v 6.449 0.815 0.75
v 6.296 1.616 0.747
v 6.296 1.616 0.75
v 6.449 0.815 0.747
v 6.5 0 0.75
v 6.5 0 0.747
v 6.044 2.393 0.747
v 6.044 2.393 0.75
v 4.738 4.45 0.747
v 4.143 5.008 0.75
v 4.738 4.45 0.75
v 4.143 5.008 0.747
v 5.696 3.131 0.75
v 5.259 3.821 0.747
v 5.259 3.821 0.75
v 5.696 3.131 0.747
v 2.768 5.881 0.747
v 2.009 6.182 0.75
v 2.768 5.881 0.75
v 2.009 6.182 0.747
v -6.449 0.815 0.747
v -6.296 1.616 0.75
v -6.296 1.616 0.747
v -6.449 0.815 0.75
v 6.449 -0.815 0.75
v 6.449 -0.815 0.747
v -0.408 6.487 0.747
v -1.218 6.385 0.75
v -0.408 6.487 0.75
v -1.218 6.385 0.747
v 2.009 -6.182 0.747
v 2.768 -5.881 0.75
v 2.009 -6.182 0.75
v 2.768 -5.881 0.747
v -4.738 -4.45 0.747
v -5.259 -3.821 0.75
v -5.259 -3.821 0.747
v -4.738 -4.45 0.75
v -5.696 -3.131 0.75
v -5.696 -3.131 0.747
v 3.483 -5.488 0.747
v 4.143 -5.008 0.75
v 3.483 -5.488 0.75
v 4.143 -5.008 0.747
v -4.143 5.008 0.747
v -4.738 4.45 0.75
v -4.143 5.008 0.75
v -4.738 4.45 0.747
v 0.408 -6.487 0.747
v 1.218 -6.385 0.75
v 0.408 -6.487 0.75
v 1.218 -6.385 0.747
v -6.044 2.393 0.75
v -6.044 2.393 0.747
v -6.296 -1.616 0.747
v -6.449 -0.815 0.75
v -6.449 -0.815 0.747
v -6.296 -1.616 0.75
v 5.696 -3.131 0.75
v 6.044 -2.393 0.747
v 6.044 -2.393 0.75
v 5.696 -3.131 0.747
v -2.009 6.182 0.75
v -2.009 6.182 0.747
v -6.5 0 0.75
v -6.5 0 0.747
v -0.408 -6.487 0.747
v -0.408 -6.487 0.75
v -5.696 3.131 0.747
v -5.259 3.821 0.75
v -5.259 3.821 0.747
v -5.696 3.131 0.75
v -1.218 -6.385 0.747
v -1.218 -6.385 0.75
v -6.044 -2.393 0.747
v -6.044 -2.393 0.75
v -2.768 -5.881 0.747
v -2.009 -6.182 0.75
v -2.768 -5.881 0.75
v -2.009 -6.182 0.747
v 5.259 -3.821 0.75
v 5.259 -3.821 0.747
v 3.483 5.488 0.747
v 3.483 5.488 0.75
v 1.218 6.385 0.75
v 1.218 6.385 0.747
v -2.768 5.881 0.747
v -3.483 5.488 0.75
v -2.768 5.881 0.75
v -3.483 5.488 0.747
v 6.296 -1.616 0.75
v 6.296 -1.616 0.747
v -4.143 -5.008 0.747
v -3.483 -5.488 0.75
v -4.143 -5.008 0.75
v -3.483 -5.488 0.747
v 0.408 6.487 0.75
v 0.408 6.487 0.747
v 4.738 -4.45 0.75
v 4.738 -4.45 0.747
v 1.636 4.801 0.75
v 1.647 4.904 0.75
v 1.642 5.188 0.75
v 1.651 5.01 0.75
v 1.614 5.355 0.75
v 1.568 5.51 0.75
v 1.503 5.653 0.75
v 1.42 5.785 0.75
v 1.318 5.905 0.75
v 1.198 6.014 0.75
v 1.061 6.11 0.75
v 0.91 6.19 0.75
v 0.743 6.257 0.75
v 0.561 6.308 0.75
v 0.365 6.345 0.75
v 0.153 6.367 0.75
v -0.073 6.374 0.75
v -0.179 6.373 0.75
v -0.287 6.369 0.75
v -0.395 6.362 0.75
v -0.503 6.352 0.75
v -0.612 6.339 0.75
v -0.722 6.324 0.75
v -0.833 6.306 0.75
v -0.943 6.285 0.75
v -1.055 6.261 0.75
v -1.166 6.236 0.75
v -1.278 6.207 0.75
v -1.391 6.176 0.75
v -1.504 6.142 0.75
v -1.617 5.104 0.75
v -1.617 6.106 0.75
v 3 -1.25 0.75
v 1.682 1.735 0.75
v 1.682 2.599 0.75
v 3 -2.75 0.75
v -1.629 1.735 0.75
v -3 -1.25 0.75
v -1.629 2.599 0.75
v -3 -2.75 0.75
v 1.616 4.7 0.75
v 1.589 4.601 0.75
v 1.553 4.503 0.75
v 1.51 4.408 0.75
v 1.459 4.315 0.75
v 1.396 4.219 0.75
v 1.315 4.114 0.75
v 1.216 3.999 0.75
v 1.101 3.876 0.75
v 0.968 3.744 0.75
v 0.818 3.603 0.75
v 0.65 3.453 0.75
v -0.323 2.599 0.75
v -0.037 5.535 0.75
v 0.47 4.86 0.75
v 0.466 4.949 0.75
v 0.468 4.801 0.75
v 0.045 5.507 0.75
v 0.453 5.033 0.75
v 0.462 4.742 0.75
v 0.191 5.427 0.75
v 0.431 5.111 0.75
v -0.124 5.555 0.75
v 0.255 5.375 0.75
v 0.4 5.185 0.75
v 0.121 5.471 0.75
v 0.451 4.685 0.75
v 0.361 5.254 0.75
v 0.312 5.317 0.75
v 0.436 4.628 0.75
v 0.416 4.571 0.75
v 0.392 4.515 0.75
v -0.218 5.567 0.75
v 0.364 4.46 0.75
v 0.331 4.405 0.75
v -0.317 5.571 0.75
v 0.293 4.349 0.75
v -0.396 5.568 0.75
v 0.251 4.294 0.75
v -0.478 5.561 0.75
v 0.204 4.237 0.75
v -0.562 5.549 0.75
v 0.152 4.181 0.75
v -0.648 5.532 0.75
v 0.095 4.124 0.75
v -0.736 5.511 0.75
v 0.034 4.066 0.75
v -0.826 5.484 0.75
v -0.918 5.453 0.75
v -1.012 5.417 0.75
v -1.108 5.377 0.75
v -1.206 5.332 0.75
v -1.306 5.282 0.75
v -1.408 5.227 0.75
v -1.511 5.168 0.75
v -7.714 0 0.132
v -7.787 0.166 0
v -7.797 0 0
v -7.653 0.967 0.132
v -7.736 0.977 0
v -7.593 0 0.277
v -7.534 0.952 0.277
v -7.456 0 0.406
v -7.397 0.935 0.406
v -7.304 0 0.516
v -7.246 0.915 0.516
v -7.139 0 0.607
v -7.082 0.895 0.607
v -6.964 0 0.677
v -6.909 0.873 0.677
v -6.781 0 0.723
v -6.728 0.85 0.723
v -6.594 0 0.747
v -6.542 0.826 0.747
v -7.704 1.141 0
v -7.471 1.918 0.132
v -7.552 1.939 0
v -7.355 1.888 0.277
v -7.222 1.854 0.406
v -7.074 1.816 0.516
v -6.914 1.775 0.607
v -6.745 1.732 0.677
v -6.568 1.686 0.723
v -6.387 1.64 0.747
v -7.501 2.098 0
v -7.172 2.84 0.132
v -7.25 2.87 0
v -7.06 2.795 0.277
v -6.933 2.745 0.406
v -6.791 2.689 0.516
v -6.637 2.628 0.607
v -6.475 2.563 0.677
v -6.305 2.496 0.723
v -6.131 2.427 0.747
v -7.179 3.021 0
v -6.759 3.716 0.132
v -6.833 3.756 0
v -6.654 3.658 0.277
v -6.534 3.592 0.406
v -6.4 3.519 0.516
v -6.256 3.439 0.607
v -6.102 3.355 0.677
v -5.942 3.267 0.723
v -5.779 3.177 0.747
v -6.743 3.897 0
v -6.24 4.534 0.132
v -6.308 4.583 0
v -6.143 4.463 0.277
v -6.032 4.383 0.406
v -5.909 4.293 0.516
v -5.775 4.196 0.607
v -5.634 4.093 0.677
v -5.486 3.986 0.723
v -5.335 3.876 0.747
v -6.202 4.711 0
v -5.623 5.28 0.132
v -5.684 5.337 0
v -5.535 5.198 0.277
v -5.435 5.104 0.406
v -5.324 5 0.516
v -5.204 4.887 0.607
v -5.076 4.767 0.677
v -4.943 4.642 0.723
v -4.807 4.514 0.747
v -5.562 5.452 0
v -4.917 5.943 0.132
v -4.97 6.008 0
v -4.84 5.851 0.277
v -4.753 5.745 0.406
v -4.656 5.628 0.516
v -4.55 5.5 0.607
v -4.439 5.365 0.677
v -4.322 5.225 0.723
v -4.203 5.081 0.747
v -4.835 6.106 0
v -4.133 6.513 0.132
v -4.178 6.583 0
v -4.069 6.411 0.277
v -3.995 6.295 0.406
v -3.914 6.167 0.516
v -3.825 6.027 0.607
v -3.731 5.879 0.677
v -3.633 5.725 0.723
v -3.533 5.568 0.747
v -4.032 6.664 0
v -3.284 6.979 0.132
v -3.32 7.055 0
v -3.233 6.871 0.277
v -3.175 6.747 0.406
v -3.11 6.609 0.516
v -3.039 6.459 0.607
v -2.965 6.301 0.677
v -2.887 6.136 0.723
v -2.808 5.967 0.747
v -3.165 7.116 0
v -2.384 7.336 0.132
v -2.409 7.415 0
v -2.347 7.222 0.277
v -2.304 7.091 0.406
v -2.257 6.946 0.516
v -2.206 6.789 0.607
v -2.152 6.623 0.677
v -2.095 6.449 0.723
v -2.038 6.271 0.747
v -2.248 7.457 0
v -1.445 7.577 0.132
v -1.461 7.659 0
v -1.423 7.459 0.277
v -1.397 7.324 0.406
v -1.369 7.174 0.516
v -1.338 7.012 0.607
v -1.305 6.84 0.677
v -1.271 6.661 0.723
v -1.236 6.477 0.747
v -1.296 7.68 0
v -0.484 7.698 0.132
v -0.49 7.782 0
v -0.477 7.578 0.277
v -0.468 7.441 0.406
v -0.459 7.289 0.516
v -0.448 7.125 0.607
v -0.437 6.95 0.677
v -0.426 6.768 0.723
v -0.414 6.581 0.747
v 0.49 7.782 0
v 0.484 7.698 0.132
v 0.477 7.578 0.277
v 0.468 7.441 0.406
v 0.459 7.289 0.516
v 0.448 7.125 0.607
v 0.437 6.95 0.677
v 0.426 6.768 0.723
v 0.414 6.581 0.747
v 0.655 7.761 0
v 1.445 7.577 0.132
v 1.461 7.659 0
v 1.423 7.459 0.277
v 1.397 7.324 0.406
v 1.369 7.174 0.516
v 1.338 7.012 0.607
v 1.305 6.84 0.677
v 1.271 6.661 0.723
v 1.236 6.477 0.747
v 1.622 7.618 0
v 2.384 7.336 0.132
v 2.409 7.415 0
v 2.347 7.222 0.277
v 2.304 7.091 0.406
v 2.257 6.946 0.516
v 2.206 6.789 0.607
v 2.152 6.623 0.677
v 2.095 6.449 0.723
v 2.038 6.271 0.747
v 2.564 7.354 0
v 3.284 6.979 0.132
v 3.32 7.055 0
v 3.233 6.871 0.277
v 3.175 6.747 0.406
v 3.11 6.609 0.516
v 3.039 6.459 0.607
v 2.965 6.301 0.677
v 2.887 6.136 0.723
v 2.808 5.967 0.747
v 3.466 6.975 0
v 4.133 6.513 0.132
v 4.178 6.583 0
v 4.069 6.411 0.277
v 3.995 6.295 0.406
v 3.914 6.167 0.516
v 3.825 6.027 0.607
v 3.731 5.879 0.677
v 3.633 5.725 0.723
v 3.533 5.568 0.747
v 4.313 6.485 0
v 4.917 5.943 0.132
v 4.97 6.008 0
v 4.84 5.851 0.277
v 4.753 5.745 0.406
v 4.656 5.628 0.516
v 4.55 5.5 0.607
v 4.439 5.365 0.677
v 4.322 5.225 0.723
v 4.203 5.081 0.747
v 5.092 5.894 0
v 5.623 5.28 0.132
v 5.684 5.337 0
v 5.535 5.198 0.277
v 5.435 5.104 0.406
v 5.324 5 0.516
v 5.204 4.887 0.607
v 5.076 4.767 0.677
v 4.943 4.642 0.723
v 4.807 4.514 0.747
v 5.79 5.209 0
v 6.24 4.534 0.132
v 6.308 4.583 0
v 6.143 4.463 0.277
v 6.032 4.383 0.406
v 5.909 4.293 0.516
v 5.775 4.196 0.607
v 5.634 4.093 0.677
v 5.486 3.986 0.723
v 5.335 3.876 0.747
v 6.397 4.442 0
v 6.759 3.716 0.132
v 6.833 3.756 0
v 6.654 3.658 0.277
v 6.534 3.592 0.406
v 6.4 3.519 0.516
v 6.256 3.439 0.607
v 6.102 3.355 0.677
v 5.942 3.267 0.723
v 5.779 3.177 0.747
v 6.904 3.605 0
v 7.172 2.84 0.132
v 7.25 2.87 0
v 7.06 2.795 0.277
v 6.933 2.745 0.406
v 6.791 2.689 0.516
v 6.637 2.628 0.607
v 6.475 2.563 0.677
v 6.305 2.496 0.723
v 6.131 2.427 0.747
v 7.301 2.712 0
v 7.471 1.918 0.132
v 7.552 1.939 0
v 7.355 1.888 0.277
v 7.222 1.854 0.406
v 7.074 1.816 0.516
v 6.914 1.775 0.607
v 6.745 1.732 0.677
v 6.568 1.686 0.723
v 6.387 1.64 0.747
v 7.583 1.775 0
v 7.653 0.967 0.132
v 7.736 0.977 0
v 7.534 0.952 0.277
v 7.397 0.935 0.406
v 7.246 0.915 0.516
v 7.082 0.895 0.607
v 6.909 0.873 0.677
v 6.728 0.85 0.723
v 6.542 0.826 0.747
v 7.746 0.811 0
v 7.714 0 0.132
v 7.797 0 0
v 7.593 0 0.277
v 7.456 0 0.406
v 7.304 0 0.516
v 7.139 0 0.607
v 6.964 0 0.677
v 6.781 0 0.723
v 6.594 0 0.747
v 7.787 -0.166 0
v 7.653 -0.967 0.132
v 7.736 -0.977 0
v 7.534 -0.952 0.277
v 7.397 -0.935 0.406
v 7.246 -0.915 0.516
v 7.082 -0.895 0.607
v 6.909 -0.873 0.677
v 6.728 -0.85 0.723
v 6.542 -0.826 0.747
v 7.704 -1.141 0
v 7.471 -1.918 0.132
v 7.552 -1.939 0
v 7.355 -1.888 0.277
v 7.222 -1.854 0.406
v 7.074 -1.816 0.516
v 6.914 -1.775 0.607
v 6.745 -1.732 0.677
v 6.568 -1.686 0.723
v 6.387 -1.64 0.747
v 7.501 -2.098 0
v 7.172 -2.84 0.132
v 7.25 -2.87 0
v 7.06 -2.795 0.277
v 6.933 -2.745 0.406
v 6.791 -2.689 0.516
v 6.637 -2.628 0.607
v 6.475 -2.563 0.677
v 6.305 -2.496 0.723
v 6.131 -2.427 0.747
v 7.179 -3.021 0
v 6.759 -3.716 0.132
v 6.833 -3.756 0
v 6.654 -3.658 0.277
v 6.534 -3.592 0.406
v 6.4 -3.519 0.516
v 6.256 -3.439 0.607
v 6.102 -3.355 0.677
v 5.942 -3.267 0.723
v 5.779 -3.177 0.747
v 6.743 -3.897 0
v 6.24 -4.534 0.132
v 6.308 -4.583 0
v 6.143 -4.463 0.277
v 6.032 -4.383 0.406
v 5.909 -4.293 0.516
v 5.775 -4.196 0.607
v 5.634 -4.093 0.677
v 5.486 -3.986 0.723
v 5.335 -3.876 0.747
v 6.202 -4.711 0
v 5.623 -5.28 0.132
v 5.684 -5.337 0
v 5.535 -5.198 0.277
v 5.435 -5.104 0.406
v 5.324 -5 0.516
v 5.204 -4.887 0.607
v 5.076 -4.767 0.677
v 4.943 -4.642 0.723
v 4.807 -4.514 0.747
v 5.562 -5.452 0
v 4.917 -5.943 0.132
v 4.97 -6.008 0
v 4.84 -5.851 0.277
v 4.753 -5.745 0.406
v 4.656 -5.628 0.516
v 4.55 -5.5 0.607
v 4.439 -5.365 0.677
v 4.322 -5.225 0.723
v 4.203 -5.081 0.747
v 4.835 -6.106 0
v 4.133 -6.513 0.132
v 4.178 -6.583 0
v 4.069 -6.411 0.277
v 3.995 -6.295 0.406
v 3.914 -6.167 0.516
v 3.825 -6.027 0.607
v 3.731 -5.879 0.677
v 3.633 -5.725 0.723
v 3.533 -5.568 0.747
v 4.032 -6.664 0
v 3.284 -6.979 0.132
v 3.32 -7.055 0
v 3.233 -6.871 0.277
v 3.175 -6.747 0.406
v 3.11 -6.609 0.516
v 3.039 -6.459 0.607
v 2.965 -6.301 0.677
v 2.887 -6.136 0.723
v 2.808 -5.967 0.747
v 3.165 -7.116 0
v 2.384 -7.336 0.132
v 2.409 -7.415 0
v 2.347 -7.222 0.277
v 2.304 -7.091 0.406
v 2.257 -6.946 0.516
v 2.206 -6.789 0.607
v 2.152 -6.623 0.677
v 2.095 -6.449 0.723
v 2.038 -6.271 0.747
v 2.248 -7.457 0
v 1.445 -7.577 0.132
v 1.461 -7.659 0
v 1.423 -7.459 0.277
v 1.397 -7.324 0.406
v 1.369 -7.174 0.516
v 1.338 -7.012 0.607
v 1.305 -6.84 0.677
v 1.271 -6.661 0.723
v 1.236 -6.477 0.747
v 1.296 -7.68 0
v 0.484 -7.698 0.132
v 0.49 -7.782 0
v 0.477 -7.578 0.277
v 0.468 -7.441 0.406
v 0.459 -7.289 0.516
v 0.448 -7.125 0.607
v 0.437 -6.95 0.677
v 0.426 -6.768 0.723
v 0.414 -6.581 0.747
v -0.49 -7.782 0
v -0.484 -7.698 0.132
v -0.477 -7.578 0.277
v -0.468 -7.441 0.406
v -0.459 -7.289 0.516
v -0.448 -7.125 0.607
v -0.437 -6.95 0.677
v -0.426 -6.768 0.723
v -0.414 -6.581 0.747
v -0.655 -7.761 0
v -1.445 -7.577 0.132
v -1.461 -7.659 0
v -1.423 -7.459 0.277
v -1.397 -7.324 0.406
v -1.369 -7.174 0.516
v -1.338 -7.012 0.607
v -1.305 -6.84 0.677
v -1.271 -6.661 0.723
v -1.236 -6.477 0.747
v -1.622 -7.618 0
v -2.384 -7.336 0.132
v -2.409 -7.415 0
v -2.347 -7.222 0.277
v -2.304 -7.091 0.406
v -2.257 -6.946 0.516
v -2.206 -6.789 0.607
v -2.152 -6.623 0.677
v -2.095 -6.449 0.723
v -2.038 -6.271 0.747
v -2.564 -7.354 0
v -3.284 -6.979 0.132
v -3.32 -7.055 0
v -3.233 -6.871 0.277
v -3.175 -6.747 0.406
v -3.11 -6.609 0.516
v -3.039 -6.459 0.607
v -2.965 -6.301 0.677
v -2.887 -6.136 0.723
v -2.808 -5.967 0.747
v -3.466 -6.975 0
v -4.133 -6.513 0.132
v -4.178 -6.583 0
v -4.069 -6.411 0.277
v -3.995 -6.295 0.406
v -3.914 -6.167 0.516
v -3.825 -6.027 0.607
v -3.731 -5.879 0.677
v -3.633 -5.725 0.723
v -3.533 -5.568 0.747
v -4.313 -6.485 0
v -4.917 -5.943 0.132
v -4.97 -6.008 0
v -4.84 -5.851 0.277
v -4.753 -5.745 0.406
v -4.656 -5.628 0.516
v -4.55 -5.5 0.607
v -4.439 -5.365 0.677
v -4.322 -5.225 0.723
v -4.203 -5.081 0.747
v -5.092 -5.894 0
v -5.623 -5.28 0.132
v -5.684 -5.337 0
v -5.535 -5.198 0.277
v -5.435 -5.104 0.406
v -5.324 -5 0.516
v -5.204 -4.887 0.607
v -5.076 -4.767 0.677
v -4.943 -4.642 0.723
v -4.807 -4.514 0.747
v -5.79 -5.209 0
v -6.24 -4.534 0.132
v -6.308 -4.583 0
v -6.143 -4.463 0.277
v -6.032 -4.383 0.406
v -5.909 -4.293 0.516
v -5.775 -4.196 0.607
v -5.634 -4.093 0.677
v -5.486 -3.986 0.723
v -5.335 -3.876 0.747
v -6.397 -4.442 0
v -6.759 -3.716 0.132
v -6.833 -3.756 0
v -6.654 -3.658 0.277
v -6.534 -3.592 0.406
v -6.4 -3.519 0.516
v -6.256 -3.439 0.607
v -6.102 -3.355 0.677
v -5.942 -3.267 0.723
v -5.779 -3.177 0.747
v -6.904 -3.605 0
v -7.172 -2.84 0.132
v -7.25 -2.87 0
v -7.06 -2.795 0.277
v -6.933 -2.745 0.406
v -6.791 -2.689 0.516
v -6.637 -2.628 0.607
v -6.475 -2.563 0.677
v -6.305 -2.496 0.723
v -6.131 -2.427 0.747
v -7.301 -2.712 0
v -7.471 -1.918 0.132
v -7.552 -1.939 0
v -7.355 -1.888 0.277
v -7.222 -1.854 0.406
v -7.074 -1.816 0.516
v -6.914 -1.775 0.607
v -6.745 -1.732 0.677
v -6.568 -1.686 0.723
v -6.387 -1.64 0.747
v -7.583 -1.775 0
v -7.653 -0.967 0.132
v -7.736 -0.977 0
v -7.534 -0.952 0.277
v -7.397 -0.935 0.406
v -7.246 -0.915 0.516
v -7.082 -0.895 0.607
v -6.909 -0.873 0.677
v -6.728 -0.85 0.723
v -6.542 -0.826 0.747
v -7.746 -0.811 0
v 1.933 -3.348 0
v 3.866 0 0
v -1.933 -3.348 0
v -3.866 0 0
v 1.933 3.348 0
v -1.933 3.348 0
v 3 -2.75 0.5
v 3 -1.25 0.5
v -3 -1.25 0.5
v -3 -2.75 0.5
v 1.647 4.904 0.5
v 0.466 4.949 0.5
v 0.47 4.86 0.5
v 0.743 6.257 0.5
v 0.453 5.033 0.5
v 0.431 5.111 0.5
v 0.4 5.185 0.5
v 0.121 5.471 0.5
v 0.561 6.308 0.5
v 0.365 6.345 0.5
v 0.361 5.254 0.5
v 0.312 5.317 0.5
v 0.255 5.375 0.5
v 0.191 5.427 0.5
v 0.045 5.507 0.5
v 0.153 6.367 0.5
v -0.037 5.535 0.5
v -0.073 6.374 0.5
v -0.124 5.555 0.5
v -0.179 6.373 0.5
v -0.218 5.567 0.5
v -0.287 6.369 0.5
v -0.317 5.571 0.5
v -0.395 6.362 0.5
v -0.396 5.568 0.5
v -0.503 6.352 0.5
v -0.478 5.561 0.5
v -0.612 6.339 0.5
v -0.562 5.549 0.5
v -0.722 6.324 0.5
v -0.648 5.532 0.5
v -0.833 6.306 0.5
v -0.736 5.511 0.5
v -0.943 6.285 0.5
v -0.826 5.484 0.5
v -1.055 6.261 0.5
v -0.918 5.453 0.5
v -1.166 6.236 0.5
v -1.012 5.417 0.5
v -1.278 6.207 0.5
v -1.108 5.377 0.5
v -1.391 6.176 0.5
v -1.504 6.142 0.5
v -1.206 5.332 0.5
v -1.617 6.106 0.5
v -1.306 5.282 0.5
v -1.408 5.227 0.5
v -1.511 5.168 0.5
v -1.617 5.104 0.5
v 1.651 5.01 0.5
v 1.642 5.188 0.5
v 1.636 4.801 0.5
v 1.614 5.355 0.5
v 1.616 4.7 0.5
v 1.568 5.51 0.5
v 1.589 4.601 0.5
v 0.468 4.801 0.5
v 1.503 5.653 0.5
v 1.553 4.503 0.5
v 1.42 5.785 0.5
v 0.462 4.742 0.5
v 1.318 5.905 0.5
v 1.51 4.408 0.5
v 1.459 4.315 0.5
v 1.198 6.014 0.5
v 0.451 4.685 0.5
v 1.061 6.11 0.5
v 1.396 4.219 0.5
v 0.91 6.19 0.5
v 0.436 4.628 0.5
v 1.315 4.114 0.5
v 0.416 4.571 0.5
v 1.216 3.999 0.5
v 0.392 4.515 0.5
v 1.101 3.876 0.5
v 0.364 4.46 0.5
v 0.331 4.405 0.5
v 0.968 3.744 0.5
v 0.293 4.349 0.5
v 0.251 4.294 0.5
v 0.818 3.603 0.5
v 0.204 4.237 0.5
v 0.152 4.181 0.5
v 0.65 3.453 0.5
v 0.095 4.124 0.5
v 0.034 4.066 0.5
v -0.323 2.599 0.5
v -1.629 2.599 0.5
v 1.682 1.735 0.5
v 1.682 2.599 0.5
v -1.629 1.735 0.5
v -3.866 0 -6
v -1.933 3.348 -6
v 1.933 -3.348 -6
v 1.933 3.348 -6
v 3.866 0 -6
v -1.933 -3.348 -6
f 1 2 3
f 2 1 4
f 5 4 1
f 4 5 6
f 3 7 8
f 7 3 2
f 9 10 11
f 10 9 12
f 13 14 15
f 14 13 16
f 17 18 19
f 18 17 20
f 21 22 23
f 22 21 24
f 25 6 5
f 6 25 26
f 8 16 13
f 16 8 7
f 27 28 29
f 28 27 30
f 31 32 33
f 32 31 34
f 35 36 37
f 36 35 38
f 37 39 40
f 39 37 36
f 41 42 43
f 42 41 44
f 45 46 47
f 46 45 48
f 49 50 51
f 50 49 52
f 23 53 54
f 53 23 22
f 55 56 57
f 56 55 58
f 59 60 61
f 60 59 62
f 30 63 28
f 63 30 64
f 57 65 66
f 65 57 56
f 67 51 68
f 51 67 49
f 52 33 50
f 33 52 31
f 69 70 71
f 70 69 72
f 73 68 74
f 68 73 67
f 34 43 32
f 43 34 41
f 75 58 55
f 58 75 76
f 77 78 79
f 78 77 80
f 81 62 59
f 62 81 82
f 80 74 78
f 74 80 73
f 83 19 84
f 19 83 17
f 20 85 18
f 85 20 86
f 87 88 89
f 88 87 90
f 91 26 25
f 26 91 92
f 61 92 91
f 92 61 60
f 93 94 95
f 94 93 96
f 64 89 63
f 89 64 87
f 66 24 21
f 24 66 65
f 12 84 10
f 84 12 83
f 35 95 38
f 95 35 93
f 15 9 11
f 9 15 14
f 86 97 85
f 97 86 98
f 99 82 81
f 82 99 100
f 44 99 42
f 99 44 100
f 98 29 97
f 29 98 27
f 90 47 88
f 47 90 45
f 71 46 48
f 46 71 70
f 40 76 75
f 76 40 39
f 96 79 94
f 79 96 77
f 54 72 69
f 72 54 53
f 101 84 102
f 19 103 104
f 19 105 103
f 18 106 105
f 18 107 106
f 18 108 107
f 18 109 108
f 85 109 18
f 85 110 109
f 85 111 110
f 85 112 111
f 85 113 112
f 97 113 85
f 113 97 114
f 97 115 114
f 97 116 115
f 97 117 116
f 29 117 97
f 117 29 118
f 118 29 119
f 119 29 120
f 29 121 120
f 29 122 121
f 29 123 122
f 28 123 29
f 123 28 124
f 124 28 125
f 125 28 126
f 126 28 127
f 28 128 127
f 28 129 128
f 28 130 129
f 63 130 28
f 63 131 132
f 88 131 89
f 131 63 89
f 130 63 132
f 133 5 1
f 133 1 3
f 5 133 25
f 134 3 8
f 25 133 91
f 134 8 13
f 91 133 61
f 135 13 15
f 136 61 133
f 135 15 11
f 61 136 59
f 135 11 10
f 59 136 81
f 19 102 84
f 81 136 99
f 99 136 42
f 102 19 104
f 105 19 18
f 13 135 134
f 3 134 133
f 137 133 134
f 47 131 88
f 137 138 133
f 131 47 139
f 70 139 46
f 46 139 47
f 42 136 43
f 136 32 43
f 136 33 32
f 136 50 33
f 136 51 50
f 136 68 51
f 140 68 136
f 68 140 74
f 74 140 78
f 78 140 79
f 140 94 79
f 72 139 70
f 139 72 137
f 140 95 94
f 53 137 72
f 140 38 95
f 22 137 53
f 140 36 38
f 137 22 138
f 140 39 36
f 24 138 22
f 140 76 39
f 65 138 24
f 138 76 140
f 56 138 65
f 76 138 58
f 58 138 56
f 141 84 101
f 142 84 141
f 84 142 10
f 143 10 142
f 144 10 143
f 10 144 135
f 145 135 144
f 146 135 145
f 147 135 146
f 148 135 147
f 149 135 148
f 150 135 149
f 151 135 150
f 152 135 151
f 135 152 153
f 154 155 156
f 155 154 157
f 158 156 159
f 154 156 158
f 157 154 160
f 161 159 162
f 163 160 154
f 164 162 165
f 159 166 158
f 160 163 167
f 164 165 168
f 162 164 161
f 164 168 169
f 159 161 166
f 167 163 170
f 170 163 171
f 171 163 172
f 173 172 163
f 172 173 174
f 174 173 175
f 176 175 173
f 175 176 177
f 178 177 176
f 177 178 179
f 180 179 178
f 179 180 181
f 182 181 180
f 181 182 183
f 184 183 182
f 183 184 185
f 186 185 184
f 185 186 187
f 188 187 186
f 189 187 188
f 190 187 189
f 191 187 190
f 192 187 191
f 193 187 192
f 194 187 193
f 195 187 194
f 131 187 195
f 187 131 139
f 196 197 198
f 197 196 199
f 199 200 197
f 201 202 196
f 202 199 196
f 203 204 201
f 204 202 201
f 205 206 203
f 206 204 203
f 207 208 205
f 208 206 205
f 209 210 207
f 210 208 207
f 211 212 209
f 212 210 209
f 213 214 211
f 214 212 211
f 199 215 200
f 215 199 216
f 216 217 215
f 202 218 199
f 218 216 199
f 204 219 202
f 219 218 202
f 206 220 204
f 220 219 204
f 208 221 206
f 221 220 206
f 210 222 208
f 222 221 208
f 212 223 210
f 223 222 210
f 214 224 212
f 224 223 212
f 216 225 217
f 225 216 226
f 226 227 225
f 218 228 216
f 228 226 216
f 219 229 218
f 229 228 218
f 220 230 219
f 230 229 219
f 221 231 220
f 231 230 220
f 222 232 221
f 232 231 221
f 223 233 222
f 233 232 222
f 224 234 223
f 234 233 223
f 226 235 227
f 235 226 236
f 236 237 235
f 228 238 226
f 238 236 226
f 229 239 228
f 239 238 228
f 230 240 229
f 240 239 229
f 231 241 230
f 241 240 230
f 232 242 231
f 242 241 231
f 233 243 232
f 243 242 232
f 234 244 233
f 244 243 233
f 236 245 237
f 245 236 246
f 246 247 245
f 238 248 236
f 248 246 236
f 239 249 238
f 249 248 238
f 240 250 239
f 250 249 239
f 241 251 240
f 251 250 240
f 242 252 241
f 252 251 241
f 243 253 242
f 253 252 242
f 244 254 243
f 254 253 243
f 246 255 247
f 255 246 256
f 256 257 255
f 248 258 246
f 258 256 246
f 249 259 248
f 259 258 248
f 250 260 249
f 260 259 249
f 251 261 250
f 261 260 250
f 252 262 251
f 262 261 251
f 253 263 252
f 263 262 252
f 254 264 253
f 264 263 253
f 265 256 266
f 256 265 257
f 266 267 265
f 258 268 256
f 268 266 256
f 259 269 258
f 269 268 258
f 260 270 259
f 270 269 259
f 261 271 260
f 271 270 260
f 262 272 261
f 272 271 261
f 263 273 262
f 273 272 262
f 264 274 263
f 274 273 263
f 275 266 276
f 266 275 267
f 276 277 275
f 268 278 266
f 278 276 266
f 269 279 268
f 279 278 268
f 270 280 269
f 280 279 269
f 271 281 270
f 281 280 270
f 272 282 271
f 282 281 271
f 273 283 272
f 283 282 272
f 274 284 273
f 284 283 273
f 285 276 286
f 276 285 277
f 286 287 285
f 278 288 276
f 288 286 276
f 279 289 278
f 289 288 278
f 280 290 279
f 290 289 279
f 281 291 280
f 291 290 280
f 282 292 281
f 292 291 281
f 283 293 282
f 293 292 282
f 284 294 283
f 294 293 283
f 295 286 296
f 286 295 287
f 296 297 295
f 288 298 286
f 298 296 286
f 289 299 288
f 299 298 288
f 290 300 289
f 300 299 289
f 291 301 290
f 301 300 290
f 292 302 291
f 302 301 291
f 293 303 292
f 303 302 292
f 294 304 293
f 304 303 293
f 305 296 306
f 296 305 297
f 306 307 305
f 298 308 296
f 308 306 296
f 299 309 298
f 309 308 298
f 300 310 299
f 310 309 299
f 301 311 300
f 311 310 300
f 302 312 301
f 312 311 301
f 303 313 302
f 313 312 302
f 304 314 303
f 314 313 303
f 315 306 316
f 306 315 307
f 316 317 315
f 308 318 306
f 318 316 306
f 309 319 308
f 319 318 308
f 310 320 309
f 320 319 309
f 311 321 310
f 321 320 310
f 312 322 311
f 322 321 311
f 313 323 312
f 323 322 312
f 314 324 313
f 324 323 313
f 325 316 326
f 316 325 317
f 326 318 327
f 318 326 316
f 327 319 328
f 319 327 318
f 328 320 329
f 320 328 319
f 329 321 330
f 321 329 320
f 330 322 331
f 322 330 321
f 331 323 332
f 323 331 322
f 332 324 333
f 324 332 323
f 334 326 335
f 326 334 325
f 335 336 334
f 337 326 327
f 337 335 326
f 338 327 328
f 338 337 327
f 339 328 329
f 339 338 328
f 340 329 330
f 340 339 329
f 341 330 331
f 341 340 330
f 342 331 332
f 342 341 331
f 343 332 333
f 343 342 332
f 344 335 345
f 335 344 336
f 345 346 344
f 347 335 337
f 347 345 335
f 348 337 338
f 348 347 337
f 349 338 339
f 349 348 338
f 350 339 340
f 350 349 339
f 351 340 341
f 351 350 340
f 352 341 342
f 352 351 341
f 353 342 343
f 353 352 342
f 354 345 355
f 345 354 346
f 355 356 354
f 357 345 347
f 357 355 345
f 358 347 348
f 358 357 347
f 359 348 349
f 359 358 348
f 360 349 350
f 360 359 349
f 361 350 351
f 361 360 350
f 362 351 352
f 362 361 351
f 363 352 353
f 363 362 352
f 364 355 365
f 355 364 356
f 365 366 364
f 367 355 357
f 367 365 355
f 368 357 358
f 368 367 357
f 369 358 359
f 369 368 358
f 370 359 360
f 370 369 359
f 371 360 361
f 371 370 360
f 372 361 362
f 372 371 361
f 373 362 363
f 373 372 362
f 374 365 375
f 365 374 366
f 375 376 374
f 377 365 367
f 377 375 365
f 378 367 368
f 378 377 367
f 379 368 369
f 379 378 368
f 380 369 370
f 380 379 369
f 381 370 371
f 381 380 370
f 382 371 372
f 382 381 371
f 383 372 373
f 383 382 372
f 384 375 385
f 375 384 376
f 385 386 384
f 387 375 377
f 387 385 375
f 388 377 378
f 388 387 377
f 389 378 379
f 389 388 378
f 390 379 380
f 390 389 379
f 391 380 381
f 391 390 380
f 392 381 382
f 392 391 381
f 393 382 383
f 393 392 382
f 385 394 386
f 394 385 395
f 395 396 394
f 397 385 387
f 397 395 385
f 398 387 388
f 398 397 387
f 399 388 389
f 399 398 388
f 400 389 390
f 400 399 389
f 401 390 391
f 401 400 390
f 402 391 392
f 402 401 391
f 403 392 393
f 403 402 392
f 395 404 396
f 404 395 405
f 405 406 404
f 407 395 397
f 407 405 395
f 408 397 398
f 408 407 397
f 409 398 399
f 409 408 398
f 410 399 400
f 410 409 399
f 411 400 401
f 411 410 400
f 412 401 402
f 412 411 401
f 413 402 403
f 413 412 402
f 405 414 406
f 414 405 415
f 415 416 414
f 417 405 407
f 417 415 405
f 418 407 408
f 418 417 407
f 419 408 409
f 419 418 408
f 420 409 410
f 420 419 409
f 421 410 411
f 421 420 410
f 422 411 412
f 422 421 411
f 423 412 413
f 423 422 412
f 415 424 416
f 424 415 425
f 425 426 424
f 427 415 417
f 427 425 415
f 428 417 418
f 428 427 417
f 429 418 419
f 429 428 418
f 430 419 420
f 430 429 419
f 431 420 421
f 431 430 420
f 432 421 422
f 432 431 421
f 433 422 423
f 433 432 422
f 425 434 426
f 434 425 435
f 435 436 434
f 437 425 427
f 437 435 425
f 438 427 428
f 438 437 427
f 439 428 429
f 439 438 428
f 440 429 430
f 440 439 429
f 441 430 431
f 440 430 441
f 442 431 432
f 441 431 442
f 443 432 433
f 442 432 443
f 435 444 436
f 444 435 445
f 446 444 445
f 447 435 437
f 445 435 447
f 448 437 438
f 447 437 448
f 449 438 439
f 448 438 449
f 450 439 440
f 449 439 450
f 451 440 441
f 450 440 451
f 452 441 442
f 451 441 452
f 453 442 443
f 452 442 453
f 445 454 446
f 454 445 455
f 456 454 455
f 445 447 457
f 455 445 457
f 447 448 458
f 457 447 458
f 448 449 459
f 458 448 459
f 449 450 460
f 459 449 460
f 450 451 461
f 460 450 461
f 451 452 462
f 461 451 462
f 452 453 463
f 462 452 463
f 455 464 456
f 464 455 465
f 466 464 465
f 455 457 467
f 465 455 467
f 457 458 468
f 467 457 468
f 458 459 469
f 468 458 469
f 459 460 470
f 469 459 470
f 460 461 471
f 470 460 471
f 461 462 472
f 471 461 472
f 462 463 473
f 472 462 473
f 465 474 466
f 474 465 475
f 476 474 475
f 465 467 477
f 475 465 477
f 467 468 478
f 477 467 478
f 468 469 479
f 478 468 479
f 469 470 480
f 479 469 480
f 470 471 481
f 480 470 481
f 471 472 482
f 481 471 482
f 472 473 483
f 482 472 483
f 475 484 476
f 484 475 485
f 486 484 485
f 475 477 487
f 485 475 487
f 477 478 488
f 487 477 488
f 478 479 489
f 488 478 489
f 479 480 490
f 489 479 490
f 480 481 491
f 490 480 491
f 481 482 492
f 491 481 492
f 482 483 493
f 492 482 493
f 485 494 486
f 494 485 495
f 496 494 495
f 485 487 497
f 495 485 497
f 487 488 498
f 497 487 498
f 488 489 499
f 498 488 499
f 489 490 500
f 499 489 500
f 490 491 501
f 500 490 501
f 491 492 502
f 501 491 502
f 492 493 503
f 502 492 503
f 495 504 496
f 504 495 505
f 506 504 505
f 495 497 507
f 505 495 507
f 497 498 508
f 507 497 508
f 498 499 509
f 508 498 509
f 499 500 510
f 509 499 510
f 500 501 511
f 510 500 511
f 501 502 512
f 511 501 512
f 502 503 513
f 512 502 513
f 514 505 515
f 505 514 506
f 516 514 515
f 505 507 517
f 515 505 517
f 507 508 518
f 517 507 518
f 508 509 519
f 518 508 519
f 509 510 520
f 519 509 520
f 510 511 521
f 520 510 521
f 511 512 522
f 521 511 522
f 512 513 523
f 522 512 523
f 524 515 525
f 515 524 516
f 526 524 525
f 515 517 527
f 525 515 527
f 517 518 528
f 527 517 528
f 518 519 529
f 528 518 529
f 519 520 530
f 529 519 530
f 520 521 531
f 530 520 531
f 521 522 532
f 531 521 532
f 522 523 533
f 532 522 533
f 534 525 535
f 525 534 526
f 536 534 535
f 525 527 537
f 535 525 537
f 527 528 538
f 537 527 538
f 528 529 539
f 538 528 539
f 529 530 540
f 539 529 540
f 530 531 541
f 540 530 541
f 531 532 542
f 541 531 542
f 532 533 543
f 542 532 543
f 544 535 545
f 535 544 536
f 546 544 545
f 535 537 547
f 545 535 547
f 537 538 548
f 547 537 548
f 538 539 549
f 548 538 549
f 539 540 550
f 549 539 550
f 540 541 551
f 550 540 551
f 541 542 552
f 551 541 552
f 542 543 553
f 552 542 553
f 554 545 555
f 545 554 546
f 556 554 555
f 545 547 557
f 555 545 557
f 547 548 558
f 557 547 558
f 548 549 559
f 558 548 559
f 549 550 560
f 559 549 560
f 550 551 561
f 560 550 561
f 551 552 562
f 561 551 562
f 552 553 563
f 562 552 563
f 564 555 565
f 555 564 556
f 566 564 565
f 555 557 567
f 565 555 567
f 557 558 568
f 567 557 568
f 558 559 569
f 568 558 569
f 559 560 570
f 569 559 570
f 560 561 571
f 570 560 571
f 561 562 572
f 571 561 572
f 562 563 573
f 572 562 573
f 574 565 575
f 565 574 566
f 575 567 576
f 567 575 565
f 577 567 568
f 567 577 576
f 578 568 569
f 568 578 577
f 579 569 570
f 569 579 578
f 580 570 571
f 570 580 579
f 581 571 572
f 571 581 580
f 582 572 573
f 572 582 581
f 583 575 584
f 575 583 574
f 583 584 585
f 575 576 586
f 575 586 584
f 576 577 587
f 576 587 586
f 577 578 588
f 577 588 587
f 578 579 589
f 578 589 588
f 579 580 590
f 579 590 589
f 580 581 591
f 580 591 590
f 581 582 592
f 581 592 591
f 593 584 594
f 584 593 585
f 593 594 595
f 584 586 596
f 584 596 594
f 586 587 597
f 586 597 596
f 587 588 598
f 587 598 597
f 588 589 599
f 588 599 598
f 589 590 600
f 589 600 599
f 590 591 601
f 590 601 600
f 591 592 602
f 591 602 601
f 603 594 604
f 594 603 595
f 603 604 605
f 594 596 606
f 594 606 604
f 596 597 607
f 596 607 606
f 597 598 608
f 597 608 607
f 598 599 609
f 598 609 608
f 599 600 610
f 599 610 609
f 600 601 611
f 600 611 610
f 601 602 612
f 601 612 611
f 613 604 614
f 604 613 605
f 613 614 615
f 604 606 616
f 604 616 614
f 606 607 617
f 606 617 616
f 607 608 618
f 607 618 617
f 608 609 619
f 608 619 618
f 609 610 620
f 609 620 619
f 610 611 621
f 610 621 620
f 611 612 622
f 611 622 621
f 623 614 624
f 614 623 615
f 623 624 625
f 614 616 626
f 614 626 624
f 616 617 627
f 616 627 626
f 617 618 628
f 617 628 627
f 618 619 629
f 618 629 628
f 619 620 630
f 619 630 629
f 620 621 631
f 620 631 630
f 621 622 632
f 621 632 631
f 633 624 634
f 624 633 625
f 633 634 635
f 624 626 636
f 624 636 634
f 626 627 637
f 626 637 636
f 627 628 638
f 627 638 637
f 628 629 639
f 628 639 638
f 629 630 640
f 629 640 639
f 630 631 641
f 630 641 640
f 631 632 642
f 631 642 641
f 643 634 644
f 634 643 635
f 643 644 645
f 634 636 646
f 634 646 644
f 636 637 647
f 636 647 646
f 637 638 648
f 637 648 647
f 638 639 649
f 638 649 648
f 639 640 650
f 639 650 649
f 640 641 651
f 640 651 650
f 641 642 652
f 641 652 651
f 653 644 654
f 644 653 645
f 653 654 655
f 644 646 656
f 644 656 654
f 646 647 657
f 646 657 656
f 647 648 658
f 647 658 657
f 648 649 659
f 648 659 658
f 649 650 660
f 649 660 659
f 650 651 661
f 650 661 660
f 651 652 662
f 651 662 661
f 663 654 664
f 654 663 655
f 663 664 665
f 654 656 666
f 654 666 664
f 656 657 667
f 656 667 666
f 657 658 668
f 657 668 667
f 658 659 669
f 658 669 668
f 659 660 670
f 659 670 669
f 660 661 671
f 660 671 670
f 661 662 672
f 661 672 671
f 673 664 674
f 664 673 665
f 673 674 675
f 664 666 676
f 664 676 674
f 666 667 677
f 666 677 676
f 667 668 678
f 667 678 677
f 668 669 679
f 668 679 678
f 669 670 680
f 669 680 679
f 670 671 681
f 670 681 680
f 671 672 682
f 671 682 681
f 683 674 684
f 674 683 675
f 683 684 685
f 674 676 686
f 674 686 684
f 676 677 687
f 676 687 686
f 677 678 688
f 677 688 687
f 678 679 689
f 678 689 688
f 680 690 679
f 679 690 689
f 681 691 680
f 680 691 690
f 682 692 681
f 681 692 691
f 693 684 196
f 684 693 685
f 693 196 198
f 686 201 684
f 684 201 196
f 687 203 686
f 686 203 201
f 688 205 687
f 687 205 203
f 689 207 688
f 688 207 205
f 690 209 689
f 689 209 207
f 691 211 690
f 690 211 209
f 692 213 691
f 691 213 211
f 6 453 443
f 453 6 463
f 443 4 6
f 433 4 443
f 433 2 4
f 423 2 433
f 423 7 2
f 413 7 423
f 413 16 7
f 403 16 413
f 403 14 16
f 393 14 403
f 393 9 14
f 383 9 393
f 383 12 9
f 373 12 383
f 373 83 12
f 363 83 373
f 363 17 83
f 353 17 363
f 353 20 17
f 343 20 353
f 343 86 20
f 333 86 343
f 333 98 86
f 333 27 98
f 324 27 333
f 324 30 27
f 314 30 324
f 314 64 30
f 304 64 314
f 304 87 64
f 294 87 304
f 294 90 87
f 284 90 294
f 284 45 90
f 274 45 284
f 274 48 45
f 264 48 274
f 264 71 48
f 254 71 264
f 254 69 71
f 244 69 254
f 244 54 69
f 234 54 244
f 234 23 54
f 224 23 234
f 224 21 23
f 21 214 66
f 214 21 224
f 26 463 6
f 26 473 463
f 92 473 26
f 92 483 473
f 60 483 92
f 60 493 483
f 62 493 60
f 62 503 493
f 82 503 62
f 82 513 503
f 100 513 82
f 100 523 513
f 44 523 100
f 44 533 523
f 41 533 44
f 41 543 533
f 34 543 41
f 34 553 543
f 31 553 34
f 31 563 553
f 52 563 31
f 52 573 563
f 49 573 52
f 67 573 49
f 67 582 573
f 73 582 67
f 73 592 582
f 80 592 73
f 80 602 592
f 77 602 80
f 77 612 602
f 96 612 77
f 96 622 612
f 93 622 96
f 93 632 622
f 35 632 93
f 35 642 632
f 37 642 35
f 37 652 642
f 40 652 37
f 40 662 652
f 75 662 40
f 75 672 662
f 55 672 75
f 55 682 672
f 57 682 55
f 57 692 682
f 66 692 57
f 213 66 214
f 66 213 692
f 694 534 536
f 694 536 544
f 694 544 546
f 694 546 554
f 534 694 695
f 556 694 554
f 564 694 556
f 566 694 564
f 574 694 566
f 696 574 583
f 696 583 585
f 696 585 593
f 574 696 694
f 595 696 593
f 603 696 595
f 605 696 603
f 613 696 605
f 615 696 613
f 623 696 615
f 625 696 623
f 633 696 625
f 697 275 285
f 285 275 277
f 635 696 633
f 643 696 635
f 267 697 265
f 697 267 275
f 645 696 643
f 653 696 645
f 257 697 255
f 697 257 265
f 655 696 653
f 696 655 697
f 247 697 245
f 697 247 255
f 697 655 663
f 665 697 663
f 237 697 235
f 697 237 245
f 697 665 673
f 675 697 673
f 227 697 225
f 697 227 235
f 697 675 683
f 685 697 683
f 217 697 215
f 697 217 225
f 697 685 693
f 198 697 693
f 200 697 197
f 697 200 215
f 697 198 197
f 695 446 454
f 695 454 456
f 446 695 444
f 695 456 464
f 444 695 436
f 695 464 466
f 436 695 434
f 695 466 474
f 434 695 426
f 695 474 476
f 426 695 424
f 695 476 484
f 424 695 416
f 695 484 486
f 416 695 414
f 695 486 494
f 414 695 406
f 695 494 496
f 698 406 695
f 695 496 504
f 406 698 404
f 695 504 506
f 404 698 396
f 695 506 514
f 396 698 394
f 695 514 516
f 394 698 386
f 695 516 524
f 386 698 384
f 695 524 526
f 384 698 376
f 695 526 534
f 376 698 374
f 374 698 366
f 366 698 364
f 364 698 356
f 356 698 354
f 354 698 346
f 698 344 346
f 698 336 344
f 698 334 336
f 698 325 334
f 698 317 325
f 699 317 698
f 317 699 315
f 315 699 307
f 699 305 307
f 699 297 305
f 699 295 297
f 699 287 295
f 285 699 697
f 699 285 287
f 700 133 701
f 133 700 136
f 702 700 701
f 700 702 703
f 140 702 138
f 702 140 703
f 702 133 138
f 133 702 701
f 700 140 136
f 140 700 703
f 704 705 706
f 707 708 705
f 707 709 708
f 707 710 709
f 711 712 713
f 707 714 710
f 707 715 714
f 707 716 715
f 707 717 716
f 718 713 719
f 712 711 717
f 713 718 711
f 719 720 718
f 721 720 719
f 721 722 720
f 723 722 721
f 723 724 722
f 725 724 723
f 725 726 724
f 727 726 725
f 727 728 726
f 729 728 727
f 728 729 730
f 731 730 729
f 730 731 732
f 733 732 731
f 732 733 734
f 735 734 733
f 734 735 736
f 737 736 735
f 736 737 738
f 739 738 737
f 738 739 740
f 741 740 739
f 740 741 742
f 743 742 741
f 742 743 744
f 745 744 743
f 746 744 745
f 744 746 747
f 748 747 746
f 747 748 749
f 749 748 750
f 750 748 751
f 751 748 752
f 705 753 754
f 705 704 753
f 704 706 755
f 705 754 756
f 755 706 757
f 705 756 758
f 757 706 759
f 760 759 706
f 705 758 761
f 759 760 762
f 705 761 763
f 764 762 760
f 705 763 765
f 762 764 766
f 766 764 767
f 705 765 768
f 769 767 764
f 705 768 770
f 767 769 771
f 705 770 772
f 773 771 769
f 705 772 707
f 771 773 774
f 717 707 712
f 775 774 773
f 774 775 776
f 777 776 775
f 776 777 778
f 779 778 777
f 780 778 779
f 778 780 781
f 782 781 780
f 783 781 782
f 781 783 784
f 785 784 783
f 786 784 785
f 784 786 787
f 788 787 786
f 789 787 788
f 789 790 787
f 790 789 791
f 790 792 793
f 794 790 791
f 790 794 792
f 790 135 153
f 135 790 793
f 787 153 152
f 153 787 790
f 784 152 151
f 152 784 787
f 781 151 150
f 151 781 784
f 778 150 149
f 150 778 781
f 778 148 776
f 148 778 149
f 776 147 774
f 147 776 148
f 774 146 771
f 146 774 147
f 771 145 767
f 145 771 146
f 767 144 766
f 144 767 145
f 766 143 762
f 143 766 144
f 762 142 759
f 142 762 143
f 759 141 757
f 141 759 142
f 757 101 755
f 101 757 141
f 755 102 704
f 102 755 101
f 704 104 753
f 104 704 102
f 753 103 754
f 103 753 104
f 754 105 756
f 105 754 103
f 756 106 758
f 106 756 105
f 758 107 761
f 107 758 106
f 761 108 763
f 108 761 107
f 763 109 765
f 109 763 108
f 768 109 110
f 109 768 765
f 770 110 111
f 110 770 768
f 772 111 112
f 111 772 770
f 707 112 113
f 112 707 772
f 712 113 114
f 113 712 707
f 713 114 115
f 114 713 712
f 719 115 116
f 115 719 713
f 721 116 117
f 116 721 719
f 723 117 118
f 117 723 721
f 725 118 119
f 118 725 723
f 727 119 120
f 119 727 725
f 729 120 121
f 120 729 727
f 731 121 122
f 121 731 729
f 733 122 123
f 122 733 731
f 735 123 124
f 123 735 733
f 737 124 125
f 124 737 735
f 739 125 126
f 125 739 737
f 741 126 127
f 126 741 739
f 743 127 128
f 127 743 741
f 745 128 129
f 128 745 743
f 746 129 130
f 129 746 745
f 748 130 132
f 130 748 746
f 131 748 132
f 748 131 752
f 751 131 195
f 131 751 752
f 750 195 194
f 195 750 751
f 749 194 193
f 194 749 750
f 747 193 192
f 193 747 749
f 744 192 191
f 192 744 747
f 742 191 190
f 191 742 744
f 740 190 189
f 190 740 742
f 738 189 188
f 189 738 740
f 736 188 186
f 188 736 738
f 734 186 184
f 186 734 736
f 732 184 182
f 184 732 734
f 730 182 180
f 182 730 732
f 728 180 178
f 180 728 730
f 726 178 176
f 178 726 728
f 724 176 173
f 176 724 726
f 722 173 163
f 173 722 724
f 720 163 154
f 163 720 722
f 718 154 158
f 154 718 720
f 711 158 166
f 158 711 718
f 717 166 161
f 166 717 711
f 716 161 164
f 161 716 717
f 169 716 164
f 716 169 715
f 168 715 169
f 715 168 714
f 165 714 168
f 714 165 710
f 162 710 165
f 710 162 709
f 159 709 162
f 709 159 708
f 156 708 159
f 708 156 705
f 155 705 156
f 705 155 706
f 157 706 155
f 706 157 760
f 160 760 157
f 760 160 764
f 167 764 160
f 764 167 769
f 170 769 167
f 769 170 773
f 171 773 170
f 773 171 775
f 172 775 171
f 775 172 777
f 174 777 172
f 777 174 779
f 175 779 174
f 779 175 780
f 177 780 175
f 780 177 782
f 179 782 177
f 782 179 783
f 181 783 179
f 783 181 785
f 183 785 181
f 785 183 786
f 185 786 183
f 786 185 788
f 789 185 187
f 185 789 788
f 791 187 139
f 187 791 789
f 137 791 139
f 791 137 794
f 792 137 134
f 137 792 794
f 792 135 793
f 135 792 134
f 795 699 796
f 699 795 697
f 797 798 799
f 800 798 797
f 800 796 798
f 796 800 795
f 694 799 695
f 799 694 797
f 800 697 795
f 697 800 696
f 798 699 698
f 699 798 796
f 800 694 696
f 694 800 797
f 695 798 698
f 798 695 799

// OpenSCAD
$fn = 50;


union() {
	difference() {
		union() {
			translate(v = [0, 0, -0.7500000000]) {
				cylinder(h = 1.5000000000, r = 6.5000000000);
			}
			translate(v = [0, 0, -0.7500000000]) {
				rotate_extrude(angle = 360) {
					translate(v = [6.5000000000, 0, 0]) {
						circle(r = 1.5000000000);
					}
				}
			}
		}
		union() {
			translate(v = [-25.0000000000, -25.0000000000, -50]) {
				cube(size = [50, 50, 50]);
			}
			#translate(v = [-3.0000000000, -2.7500000000, 0.5000000000]) {
				cube(size = [6, 1.5000000000, 0.2500000000]);
			}
			#translate(v = [0, 4, 0.5000000000]) {
				linear_extrude(height = 0.2500000000) {
					text(font = "SegoiUI:Bold", halign = "center", size = 4.5000000000, text = "2", valign = "center");
				}
			}
		}
	}
	union() {
		translate(v = [0, 0, -6]) {
			linear_extrude(height = 6) {
				polygon(points = [[3.8658550000, 0.0000000000], [1.9329275000, 3.3479286373], [-1.9329275000, 3.3479286373], [-3.8658550000, 0.0000000000], [-1.9329275000, -3.3479286373], [1.9329275000, -3.3479286373]]);
			}
		}
	}
}
